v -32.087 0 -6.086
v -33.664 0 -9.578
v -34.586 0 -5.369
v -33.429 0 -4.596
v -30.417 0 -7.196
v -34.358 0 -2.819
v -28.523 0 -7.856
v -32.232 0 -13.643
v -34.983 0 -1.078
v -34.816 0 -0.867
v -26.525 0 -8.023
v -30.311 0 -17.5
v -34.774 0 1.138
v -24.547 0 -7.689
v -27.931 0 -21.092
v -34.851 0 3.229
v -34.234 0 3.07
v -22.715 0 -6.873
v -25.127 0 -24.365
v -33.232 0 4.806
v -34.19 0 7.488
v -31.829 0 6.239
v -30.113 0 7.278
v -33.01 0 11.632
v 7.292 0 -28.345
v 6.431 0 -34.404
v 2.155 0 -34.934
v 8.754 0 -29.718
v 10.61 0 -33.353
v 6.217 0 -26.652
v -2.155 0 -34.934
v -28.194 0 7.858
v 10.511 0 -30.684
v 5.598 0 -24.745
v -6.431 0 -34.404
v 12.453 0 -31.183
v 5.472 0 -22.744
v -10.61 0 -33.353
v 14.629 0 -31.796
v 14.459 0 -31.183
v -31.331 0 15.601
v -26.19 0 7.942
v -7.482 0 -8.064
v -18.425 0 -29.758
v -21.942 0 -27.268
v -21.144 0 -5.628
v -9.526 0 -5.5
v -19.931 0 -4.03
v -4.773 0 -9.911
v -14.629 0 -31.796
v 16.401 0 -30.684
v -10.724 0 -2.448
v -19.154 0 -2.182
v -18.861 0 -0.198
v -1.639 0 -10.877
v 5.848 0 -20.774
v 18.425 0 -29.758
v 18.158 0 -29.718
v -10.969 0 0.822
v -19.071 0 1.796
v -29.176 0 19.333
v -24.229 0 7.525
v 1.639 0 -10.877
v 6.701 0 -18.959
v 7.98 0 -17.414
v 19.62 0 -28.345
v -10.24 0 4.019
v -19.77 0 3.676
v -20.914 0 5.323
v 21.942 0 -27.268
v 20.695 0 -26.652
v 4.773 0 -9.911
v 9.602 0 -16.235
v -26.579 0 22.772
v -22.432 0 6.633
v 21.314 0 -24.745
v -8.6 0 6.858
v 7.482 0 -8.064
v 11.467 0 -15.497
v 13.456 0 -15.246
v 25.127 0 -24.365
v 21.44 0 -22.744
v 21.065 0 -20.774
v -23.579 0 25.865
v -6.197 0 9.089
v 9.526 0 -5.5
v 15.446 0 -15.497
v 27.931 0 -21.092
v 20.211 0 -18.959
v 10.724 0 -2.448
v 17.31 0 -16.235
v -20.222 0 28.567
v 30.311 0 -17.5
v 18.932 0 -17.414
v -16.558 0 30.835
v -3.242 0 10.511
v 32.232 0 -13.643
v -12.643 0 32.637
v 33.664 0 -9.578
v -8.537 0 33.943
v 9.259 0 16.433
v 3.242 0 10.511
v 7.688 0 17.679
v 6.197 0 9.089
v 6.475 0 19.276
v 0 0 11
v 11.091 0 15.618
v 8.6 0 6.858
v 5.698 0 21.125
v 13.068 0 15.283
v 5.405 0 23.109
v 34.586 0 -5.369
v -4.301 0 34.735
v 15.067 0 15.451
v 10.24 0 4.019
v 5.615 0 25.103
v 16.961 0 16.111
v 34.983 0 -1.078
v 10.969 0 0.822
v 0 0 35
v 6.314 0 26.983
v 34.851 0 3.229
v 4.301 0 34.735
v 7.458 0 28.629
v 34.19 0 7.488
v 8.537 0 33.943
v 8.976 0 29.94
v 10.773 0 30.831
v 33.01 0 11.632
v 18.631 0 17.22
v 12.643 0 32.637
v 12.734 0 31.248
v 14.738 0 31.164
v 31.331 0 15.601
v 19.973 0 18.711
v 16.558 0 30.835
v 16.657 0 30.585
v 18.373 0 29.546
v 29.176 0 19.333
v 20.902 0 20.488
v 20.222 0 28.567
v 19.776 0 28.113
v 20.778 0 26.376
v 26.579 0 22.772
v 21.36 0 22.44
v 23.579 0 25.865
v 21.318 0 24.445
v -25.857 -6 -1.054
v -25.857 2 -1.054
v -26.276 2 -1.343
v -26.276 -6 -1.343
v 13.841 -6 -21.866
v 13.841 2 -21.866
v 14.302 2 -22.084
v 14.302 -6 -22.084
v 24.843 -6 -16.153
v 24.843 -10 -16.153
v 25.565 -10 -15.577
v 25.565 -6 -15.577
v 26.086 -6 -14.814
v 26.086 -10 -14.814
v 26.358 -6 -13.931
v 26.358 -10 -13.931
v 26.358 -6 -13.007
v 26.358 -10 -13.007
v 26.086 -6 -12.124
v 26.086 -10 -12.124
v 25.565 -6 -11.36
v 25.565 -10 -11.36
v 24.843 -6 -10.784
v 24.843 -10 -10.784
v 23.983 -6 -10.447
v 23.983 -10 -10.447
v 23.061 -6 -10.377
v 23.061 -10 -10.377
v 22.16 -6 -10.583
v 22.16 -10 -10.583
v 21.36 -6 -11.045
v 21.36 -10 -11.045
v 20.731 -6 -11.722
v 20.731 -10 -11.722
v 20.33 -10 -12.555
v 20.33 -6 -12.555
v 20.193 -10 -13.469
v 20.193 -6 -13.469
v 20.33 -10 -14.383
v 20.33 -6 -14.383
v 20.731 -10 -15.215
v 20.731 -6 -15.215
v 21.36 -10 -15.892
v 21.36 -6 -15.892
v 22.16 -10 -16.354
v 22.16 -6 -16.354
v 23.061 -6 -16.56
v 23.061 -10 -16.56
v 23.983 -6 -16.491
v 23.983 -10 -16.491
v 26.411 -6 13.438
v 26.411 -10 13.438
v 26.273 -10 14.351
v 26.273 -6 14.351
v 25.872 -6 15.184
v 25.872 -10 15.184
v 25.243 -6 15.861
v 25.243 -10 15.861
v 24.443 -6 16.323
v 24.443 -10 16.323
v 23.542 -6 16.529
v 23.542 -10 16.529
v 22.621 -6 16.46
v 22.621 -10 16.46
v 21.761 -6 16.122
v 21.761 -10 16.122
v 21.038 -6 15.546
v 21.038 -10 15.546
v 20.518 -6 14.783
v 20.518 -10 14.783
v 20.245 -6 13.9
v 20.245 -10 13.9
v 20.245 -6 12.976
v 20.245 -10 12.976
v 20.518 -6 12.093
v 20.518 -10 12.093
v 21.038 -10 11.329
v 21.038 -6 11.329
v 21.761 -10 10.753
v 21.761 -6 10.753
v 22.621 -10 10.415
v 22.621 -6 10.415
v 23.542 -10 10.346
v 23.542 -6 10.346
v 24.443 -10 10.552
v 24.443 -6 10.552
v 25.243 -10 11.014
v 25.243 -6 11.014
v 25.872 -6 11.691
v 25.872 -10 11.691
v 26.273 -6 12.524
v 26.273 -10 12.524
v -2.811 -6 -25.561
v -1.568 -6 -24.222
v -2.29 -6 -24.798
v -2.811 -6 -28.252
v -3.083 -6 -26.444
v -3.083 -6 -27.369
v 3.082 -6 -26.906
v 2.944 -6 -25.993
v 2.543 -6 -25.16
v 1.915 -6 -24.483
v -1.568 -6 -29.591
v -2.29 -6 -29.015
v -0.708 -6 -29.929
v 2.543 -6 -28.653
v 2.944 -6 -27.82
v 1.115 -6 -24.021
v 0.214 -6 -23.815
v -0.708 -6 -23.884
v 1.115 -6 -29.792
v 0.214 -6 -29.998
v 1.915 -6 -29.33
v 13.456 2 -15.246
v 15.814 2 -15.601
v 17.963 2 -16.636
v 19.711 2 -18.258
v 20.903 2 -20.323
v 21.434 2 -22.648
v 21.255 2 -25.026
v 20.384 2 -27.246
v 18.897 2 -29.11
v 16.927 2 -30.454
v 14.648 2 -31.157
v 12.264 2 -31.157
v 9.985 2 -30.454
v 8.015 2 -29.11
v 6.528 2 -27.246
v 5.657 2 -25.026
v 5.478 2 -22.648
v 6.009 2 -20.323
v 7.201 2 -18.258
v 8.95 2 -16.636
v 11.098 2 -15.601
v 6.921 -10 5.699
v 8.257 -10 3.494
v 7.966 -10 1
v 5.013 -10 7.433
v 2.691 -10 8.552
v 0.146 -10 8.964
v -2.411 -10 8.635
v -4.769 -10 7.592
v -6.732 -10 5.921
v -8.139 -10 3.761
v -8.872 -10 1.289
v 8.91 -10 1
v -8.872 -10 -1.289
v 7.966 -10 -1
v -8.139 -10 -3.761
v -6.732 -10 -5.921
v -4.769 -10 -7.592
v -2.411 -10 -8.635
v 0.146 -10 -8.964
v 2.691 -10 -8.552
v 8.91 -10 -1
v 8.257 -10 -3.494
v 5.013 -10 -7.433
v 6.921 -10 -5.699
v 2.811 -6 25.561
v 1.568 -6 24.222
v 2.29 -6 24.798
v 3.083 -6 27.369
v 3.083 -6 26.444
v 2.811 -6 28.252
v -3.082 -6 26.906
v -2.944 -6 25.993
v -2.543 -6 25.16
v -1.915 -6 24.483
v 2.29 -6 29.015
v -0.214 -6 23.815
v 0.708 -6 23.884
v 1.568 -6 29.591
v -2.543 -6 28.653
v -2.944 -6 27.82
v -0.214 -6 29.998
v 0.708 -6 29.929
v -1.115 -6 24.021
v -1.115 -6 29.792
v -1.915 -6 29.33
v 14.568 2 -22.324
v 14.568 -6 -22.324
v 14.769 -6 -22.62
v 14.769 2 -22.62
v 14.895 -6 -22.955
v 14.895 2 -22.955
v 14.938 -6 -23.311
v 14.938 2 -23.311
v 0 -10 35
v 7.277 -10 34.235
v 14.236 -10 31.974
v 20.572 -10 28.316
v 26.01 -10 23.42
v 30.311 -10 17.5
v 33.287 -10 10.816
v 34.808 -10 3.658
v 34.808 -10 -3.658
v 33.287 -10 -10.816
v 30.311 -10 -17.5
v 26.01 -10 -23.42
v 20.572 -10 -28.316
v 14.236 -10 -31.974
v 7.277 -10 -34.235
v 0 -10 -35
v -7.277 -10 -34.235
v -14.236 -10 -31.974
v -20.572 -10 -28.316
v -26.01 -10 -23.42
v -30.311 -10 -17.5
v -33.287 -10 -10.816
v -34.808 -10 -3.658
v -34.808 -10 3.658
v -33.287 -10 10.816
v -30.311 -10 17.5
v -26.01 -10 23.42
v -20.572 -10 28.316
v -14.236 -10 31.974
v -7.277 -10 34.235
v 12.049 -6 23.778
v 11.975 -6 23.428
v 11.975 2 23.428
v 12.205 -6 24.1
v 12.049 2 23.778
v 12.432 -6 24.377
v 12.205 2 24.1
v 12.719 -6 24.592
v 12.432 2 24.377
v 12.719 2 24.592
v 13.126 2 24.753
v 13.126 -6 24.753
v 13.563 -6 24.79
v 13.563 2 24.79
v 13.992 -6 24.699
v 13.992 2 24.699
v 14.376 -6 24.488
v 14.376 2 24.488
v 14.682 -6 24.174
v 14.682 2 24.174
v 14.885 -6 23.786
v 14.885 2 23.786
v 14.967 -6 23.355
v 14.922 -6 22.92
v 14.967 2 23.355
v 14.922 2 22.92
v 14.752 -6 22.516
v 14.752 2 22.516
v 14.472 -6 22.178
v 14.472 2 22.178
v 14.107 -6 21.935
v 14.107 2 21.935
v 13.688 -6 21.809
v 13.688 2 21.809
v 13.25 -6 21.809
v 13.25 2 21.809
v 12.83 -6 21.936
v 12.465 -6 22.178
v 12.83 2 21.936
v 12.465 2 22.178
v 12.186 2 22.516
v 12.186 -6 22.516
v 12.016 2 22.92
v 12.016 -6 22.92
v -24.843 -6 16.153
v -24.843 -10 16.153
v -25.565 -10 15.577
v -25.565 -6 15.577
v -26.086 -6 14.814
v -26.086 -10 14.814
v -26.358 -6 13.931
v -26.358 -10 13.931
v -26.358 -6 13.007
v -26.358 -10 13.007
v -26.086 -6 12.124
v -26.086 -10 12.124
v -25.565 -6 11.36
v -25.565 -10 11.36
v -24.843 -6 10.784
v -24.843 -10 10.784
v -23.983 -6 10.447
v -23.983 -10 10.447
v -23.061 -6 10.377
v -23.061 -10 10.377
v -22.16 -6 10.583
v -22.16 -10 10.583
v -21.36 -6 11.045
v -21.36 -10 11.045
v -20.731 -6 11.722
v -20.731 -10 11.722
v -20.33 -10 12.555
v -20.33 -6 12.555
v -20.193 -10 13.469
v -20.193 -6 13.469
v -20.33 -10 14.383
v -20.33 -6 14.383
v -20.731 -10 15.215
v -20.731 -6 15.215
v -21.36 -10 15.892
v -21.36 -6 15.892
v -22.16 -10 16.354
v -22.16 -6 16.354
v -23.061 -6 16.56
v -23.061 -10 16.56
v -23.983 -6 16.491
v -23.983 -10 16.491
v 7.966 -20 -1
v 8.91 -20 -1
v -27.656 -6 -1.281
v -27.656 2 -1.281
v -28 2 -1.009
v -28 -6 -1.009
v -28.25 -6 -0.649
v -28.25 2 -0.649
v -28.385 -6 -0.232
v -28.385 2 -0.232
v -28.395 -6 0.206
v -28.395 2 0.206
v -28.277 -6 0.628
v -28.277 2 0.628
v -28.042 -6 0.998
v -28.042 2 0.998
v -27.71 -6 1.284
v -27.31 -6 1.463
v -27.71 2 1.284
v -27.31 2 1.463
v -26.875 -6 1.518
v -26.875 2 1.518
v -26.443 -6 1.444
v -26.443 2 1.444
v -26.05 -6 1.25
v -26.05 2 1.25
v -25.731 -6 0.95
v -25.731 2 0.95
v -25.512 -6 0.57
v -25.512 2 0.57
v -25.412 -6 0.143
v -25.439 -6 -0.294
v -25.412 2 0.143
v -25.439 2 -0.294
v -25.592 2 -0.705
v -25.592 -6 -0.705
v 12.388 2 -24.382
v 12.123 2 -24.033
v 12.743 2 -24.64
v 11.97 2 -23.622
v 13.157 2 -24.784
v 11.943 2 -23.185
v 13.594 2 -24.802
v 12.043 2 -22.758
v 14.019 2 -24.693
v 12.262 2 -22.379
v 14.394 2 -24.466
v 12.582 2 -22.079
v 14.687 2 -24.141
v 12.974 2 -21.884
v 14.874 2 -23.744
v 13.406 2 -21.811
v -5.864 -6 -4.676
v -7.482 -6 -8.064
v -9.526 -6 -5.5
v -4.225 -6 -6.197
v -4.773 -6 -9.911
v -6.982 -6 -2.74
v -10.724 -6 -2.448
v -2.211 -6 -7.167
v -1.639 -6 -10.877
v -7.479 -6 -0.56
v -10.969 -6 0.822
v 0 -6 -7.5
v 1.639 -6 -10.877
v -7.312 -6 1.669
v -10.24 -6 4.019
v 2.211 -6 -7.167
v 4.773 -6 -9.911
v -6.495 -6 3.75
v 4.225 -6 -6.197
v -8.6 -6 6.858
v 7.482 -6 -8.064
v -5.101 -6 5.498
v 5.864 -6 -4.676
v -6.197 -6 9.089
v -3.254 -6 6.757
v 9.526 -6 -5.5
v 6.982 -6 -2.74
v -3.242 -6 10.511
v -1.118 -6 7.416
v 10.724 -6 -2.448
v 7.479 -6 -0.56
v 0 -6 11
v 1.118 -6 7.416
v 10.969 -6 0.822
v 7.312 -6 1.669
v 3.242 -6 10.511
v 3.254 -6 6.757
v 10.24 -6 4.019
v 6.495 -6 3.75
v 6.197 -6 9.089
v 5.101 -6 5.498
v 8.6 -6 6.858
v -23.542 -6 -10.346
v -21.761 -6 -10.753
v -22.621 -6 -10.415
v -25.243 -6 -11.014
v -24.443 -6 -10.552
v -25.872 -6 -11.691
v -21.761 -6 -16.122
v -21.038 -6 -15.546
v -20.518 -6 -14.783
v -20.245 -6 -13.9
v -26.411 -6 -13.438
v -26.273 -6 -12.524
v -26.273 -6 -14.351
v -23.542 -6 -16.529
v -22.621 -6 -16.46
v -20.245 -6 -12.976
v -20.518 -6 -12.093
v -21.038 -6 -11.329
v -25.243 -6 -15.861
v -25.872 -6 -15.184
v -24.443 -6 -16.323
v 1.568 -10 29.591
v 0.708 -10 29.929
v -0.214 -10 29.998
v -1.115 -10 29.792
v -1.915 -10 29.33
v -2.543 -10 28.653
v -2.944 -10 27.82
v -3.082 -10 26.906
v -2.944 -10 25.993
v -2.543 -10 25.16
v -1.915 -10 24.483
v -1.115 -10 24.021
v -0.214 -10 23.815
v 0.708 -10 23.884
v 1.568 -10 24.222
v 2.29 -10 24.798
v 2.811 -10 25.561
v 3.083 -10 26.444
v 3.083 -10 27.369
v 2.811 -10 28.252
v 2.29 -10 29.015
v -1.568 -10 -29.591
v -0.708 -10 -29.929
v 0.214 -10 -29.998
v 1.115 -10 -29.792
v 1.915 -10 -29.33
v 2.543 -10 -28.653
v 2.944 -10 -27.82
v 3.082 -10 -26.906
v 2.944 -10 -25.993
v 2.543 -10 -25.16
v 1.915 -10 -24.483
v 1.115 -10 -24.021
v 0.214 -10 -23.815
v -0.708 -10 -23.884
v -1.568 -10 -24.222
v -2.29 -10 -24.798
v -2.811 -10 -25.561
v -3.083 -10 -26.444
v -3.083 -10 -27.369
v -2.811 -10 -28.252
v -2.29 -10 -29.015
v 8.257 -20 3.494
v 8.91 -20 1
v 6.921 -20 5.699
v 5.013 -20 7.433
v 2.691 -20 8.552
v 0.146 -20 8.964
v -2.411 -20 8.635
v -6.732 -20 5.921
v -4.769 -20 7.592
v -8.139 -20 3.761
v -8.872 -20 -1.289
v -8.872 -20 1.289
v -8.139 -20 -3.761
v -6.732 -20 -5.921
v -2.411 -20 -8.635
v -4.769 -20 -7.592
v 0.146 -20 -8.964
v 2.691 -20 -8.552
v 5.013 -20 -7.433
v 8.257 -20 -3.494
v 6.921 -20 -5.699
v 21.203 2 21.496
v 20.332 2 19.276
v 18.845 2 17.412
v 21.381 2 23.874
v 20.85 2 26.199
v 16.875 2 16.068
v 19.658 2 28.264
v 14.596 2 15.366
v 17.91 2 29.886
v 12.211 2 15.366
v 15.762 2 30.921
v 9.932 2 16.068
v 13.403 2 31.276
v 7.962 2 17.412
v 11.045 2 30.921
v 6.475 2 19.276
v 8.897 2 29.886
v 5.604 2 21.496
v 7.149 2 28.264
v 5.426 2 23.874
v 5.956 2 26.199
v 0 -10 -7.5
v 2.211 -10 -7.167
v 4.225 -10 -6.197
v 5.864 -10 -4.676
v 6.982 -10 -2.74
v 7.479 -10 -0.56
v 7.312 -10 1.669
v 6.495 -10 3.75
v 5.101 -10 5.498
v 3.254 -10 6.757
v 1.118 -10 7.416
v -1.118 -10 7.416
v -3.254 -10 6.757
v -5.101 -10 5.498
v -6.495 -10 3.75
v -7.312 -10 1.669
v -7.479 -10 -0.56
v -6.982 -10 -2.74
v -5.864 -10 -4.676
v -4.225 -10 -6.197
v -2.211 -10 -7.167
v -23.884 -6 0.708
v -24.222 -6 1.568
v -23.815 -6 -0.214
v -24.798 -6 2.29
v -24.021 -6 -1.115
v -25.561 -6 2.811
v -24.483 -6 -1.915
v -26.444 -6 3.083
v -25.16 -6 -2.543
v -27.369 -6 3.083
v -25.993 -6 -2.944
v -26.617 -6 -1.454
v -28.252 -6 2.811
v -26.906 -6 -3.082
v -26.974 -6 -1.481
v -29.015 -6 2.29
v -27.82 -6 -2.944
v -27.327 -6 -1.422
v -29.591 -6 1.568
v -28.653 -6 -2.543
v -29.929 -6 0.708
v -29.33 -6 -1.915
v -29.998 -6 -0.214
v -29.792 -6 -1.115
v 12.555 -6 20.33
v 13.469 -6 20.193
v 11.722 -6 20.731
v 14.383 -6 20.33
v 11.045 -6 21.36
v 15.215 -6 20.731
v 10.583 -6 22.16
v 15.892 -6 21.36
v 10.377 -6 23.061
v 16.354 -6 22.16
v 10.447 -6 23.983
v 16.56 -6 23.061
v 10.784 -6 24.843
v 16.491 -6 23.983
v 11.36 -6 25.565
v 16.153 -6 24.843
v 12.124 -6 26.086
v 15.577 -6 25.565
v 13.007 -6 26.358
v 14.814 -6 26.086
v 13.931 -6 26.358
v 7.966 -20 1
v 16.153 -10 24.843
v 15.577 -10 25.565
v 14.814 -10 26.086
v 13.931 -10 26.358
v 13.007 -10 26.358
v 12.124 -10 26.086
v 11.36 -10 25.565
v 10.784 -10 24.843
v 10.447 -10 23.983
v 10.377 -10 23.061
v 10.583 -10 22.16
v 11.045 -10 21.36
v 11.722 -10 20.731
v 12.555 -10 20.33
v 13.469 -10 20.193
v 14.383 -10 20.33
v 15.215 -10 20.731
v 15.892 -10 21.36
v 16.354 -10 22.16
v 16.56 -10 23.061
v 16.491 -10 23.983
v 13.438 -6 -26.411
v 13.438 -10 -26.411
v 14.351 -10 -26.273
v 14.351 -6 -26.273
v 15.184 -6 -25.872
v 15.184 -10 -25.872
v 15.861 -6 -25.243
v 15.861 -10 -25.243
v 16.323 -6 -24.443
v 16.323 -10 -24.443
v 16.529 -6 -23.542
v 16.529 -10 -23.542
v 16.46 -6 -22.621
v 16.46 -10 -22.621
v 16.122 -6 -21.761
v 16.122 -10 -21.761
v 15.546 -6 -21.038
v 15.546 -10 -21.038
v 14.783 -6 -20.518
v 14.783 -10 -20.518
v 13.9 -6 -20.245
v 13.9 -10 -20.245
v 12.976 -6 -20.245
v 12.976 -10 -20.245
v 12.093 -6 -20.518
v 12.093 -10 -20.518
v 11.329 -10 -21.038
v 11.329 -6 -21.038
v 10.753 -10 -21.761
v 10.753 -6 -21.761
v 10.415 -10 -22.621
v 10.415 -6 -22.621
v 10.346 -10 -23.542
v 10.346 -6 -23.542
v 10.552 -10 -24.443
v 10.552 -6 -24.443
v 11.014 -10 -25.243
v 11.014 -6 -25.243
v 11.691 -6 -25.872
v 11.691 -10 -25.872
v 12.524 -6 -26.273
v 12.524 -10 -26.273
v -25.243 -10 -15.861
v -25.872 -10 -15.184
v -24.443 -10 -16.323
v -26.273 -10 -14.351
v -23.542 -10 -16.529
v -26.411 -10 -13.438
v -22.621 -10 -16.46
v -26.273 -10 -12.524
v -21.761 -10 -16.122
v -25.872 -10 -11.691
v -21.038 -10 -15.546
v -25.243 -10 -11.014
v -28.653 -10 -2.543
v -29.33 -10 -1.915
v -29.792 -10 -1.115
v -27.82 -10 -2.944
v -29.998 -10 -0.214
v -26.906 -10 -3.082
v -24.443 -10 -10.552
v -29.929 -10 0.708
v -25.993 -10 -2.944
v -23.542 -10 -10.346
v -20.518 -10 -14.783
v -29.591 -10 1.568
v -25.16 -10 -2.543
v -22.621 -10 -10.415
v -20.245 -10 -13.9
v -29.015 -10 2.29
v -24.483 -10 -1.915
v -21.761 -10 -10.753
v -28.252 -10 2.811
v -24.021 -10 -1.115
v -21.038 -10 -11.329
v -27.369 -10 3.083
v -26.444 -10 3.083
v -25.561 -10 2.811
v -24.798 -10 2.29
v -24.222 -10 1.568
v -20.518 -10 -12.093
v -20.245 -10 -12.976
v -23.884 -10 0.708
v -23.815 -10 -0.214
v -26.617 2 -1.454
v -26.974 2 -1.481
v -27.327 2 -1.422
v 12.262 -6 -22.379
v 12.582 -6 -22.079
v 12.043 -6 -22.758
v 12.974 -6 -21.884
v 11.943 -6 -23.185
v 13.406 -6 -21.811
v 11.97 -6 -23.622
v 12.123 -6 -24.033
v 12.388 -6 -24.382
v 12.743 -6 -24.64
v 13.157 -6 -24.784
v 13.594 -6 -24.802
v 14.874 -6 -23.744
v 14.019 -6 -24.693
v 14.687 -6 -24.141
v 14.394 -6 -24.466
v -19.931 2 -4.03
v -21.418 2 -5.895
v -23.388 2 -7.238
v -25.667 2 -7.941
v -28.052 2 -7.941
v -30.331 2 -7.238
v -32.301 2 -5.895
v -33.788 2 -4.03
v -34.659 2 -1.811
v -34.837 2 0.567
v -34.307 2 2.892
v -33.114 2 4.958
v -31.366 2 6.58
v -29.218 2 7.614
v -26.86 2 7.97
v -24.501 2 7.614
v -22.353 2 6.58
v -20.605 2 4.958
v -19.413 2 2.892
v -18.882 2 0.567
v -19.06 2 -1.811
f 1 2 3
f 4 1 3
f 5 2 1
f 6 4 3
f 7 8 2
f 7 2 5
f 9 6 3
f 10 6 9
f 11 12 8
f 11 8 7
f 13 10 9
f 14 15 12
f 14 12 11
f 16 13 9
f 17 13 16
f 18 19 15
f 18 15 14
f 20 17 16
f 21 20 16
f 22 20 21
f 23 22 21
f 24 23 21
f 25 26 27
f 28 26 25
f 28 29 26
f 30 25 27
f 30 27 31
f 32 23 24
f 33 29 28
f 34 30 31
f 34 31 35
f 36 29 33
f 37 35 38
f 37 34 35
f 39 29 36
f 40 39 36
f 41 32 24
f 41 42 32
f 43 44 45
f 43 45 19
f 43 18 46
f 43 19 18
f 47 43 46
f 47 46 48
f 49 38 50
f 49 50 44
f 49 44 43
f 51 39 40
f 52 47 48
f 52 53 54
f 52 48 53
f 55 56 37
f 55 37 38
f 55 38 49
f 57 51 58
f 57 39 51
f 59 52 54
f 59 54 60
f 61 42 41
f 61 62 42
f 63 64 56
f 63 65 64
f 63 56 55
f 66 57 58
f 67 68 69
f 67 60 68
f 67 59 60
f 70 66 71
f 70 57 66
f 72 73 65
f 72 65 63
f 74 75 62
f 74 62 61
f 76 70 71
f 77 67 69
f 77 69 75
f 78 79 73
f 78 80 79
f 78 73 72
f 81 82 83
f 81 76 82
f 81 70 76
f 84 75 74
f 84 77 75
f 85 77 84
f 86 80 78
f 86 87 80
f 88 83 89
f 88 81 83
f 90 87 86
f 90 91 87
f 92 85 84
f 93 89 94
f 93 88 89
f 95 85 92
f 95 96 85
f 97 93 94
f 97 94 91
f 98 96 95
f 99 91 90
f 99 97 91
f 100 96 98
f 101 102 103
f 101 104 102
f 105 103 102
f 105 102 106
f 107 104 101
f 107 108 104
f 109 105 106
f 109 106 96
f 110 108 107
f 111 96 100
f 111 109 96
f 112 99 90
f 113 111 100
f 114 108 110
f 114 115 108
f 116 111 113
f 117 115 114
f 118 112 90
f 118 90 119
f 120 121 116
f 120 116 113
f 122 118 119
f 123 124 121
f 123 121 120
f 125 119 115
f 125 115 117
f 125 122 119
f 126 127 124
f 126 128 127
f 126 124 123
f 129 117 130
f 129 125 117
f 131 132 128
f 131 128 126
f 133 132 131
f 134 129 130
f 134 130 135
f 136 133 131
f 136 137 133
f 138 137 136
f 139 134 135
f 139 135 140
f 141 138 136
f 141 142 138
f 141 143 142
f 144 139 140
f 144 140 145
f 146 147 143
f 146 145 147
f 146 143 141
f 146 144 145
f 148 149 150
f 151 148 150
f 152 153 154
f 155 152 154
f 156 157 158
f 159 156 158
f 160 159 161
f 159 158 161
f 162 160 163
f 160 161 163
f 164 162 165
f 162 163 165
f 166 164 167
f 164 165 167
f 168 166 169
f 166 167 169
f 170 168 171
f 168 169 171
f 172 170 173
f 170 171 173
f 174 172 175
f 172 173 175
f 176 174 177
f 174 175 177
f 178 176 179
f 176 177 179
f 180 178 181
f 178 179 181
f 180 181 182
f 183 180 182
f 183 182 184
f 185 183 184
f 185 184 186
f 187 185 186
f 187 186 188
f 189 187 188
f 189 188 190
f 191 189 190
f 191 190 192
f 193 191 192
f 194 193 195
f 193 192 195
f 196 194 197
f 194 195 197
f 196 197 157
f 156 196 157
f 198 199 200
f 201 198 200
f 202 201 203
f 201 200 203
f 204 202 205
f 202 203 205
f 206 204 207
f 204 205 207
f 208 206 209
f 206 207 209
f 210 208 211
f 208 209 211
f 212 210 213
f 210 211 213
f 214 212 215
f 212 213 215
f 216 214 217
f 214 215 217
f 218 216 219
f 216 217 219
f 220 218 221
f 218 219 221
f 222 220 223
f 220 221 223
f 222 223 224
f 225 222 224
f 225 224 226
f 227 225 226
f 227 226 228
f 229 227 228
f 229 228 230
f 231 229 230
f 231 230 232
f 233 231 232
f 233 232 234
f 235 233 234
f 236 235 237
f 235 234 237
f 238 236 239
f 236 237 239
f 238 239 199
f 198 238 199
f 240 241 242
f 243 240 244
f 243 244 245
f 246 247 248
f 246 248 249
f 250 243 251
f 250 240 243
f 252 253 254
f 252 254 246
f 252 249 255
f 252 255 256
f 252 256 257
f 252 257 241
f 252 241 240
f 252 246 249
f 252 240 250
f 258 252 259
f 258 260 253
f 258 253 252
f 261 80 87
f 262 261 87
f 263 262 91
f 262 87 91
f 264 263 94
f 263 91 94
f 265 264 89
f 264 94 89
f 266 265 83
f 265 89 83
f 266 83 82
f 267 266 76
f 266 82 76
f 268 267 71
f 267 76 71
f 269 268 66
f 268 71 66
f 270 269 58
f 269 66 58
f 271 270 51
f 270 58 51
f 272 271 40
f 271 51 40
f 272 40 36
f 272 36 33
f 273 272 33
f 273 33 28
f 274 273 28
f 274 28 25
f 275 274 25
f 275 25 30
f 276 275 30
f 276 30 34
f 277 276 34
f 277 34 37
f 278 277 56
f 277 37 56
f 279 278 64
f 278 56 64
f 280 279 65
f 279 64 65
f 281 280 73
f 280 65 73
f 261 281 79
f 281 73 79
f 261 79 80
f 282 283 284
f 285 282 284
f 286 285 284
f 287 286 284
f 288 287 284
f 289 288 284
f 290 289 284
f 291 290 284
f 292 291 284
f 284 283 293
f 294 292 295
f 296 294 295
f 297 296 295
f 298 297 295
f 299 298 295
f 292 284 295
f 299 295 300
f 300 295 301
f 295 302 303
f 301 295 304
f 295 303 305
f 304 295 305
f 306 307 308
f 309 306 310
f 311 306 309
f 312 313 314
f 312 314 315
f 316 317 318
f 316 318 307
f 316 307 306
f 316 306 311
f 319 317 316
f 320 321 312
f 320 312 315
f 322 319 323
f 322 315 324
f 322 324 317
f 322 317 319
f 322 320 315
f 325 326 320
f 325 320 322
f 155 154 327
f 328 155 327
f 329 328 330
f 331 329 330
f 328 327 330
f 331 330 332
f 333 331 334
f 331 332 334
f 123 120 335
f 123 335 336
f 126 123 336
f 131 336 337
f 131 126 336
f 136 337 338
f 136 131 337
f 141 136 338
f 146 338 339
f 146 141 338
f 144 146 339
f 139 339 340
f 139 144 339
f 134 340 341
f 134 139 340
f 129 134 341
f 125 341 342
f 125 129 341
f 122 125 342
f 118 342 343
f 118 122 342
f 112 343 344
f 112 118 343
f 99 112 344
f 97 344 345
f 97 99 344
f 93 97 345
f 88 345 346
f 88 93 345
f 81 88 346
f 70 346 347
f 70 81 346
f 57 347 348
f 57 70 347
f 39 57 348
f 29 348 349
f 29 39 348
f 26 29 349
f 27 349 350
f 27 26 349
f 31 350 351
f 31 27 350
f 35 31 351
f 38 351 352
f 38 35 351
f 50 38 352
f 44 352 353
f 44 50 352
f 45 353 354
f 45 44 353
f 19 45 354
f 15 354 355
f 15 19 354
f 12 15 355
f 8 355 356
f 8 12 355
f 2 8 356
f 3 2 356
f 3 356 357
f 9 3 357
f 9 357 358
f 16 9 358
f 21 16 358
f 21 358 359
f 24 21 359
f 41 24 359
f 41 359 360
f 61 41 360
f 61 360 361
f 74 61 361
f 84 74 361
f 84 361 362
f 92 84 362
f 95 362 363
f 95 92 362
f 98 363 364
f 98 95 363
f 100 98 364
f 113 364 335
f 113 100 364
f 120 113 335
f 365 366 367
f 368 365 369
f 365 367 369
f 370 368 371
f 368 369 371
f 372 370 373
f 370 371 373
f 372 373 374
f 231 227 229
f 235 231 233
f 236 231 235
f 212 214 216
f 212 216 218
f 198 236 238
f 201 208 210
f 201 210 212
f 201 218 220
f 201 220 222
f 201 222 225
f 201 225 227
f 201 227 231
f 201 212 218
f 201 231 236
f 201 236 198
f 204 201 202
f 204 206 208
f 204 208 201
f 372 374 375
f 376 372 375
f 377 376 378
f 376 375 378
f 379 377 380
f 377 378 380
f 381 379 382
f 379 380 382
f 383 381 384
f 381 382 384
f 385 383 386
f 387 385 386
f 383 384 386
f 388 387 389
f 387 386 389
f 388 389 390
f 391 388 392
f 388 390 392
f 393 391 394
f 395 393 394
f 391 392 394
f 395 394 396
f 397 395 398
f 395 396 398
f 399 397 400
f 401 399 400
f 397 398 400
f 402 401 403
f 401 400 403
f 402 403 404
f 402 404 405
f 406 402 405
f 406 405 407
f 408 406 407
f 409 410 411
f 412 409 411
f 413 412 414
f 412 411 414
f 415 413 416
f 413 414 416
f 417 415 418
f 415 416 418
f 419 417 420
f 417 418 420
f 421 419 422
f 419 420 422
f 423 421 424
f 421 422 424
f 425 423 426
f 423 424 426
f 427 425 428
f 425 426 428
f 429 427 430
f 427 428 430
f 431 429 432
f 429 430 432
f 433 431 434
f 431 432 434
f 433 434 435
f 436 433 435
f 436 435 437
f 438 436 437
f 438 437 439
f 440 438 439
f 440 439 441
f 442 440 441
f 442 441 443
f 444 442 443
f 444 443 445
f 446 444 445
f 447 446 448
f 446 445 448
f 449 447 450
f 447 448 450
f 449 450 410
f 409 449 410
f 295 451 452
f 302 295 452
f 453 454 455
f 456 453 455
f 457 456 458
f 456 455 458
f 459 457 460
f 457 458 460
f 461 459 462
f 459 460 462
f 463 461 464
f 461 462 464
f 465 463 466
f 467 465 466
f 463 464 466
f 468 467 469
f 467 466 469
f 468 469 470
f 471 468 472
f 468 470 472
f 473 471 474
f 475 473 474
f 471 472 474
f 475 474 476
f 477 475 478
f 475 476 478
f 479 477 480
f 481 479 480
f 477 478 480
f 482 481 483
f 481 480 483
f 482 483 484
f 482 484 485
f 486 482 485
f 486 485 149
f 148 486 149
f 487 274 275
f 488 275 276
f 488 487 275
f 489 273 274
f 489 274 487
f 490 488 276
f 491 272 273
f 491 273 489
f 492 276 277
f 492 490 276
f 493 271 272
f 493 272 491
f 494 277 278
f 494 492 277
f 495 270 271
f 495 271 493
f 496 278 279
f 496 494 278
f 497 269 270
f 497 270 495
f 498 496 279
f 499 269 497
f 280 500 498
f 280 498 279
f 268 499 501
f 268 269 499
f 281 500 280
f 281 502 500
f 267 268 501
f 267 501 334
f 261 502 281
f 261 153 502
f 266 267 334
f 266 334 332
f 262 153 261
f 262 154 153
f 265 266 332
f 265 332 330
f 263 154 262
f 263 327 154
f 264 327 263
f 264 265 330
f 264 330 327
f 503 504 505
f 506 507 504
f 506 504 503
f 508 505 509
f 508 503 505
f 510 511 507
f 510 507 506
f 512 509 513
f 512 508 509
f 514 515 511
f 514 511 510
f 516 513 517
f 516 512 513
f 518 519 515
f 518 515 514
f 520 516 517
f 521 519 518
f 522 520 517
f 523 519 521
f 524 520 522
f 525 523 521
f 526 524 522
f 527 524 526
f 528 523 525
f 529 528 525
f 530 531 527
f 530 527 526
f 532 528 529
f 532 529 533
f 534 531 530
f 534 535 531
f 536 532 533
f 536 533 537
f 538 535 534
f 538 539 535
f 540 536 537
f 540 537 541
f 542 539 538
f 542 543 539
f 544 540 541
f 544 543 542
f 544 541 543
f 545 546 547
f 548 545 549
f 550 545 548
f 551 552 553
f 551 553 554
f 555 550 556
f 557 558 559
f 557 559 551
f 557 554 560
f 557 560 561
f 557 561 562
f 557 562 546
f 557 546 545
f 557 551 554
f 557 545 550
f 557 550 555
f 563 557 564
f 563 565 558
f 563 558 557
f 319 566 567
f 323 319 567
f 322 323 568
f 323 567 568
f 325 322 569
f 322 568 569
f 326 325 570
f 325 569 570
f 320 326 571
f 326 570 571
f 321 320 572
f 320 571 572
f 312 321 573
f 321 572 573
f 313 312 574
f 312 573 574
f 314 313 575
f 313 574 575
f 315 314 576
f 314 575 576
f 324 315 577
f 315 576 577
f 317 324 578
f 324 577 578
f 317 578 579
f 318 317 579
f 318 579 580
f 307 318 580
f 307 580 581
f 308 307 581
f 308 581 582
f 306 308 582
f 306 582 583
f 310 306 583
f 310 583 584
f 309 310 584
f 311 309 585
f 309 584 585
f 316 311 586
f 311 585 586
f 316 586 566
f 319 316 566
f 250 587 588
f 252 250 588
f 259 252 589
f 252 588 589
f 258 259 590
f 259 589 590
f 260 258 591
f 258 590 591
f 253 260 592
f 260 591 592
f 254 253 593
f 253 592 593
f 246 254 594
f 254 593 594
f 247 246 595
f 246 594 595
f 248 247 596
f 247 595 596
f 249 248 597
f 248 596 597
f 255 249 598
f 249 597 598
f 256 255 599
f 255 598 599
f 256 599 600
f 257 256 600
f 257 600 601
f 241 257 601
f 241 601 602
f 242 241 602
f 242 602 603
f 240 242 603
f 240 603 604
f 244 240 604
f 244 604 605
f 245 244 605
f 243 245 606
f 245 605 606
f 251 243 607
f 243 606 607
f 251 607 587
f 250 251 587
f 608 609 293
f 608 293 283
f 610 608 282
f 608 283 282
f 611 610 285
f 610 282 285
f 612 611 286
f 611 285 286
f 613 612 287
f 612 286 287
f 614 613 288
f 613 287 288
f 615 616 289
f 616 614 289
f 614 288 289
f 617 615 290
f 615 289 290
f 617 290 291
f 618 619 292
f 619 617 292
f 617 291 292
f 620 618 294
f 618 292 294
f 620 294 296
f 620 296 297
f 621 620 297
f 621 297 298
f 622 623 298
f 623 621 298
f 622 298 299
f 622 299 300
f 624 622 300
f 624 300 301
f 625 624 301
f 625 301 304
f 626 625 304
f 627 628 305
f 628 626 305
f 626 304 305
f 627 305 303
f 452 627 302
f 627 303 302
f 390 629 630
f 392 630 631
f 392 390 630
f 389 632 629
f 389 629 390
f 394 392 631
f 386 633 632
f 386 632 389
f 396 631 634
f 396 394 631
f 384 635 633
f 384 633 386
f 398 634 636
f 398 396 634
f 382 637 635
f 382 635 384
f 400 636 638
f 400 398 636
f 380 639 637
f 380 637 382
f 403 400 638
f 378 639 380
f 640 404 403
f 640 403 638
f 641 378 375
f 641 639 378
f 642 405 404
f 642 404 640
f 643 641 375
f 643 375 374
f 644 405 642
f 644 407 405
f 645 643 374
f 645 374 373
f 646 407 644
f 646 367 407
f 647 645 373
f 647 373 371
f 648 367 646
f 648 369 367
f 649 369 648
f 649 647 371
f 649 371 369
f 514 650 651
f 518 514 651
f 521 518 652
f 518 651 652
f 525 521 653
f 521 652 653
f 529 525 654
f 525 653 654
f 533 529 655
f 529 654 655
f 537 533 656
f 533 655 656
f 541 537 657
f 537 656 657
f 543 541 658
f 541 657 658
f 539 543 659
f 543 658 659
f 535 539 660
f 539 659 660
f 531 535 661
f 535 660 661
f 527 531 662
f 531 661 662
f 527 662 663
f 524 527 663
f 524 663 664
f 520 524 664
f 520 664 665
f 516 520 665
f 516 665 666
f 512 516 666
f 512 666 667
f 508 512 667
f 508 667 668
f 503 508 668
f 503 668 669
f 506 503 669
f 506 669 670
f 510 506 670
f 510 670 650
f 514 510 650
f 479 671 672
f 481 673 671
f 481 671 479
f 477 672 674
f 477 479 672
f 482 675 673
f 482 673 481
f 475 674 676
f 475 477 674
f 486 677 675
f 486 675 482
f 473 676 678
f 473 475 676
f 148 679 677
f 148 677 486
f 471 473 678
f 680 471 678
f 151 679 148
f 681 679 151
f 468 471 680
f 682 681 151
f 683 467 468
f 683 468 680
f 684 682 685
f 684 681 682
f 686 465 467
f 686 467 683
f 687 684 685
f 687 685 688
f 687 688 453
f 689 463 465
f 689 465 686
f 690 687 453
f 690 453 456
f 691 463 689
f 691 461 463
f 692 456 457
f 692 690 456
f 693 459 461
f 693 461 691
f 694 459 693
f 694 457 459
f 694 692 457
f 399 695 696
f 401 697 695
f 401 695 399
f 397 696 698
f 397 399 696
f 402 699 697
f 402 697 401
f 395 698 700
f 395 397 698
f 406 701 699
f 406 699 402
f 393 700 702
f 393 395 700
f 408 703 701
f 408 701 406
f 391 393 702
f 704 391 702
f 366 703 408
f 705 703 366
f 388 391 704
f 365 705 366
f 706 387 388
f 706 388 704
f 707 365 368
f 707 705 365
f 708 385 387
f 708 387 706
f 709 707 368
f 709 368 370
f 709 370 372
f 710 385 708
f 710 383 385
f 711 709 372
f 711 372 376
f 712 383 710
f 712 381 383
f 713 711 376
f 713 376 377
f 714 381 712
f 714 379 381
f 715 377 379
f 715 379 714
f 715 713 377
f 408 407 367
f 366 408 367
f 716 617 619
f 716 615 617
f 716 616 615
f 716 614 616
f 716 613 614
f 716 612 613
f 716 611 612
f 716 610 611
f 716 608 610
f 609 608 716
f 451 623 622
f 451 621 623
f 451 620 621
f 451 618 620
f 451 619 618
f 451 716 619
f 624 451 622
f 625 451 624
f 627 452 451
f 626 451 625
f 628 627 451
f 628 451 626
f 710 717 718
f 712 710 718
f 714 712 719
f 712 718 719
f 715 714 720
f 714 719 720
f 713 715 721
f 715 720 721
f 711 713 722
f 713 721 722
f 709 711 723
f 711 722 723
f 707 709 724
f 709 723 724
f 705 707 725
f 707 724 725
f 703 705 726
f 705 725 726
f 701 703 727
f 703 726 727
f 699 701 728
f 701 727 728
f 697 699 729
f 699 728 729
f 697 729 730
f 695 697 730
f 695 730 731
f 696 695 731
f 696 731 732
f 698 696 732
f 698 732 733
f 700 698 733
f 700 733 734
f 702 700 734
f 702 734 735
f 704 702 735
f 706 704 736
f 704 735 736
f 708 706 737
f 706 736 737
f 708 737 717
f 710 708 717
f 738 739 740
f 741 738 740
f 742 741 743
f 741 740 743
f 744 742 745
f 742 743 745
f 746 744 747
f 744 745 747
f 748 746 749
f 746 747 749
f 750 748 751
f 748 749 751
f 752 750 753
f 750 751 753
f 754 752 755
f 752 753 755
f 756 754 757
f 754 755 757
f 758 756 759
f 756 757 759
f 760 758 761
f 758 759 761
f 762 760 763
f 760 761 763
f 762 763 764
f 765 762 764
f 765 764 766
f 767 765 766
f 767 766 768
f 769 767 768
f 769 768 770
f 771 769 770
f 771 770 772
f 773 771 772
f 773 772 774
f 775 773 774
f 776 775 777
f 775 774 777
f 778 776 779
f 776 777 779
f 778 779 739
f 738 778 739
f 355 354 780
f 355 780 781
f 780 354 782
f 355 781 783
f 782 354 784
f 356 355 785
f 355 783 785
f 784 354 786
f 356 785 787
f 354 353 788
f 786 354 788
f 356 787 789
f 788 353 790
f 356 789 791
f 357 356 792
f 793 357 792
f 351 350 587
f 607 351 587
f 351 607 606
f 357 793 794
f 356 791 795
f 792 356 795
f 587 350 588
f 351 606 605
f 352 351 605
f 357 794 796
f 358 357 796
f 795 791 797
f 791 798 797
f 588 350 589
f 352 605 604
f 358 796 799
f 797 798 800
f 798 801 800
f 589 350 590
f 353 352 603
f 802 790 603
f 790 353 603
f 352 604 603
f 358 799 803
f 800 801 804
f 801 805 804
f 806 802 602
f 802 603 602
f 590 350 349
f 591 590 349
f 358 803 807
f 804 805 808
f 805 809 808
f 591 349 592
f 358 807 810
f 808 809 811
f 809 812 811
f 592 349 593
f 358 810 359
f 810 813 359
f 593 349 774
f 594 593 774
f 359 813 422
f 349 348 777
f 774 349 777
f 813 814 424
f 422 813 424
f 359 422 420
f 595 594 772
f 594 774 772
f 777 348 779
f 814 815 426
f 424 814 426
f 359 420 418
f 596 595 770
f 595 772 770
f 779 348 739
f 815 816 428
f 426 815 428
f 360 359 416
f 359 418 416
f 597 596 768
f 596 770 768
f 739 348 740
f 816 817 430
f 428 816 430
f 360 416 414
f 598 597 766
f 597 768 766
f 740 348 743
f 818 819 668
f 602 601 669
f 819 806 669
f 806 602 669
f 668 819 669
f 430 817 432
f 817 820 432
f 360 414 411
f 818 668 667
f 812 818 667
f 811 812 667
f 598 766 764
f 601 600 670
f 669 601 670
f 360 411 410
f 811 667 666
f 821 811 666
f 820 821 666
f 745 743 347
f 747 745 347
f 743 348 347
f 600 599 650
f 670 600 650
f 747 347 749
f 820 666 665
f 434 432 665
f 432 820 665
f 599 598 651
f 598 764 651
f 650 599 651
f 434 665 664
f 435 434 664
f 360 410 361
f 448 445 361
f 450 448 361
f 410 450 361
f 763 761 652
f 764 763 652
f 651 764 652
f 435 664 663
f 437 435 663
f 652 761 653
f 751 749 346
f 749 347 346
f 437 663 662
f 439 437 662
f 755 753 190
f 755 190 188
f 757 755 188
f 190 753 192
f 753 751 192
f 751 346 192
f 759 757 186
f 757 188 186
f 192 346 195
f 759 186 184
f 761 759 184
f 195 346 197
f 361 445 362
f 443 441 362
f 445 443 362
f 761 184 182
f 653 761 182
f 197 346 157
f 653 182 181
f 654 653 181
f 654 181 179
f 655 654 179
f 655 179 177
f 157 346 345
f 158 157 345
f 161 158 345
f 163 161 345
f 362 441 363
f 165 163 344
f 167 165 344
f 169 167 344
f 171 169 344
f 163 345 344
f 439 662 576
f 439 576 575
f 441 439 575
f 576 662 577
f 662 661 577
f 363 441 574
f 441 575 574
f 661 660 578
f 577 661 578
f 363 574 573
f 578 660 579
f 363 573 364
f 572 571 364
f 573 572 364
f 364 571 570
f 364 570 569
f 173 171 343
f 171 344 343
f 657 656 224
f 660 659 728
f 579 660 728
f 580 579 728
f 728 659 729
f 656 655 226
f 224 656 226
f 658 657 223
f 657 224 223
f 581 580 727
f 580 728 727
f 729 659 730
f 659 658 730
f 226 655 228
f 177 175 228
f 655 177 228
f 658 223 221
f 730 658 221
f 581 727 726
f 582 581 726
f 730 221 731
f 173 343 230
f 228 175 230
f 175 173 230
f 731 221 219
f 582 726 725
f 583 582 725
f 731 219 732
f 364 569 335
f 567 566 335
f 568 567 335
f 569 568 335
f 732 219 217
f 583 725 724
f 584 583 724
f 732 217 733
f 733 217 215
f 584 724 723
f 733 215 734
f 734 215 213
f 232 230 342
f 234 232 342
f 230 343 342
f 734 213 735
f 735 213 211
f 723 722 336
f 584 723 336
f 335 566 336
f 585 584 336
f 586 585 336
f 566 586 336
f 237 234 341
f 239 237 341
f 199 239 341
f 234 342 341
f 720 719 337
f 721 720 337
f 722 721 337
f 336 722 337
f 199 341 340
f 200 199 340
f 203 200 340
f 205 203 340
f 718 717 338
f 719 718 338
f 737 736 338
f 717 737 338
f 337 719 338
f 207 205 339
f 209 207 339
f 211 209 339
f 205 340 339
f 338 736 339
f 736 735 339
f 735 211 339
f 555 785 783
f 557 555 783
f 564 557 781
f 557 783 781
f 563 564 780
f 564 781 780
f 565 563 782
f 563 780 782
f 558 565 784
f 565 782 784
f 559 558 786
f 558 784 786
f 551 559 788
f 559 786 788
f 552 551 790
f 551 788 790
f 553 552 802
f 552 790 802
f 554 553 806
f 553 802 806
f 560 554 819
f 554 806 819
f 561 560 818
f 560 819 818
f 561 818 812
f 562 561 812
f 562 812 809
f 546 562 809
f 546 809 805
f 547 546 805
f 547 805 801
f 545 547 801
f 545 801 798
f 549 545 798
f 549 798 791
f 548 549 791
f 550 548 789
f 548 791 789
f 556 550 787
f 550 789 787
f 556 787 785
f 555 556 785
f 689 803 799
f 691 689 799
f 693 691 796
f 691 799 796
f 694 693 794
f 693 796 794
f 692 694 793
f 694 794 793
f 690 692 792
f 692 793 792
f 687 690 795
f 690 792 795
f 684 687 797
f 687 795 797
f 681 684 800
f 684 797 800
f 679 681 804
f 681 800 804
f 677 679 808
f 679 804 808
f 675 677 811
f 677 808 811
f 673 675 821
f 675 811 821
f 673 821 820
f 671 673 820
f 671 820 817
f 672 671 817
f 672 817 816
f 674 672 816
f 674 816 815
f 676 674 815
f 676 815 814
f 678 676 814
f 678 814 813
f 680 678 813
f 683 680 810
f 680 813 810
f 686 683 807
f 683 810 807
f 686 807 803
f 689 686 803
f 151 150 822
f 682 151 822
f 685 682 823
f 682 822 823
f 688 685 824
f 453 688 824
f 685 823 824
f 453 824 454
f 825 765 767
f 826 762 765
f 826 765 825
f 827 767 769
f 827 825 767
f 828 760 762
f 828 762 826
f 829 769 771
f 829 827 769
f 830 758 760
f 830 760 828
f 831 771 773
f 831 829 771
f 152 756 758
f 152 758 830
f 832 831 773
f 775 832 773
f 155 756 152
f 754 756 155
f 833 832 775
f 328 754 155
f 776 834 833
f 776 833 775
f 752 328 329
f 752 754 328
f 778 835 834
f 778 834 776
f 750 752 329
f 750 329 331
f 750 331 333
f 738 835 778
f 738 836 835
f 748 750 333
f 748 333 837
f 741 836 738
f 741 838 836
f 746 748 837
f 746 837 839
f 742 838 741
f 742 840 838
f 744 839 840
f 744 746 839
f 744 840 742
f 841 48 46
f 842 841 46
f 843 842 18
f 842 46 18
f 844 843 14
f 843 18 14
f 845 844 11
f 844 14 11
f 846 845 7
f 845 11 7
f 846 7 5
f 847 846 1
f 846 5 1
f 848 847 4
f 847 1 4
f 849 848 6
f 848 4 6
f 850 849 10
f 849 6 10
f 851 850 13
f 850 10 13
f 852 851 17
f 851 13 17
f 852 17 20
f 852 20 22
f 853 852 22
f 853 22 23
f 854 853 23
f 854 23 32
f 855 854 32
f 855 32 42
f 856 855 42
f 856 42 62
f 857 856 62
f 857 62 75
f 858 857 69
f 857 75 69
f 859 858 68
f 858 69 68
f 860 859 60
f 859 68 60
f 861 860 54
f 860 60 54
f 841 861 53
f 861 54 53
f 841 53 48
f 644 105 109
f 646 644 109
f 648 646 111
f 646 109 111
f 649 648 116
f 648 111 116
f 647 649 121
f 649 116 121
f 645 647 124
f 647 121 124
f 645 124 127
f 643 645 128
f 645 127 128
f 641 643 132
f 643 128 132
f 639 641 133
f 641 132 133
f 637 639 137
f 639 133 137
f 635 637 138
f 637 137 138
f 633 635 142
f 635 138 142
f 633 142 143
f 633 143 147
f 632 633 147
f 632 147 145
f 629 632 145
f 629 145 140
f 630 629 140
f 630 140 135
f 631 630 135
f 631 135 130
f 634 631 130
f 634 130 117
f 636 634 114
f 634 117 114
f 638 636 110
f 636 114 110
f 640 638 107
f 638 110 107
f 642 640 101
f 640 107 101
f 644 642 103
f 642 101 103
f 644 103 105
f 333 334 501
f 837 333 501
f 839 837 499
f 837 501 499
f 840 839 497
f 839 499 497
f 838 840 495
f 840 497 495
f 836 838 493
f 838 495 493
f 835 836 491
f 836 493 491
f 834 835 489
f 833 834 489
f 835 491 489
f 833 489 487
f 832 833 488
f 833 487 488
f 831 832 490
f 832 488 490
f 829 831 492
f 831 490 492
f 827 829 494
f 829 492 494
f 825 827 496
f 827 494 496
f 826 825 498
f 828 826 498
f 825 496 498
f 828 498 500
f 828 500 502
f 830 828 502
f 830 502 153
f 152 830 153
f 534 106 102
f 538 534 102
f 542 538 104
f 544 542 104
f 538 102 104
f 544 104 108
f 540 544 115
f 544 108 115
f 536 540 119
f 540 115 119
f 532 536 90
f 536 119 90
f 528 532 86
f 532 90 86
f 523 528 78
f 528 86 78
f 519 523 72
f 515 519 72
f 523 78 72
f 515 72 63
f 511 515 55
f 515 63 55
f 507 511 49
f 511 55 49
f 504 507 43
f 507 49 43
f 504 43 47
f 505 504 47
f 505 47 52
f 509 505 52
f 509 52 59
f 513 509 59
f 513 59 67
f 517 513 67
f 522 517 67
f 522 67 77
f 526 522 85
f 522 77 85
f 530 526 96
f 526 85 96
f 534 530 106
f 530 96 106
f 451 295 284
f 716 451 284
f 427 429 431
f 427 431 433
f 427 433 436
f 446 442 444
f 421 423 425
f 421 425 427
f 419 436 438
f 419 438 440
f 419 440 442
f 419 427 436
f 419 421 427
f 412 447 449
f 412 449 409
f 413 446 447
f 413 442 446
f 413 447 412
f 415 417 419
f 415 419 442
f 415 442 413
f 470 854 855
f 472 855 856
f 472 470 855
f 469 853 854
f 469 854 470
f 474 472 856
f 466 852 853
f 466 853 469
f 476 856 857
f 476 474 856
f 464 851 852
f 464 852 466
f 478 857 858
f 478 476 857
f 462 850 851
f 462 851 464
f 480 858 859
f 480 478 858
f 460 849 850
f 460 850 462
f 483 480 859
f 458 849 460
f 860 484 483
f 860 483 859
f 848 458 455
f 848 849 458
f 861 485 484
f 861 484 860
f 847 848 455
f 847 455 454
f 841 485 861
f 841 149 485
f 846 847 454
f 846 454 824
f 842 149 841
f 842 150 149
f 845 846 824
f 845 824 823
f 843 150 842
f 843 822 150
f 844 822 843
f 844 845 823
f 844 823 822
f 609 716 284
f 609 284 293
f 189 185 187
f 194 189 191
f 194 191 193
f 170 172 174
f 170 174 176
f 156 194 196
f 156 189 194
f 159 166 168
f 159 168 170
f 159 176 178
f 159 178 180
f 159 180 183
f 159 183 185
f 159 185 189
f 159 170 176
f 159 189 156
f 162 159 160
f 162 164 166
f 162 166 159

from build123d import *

# Parameters (mm, degrees)
SKETCH1_R                   = 35
BOSS_EXTRUDE1_DEPTH         = 10
SKETCH2_R                   = 11
CUT_EXTRUDE1_DEPTH          = 6
SKETCH3_R                   = 7.5
CUT_EXTRUDE2_DEPTH          = 6
SKETCH4_R                   = 8
BOSS_EXTRUDE2_DEPTH         = 2
CUT_EXTRUDE3_DEPTH          = 21
SKETCH6_R                   = 3.1
CUT_EXTRUDE4_DEPTH          = 4
CIRPATTERN1_COUNT           = 3
CIRPATTERN2_COUNT           = 3
CIRPATTERN3_COUNT           = 2
CIRPATTERN3_ANGLE           = 30
CIRPATTERN4_COUNT           = 2
CIRPATTERN4_ANGLE           = 30
CIRPATTERN5_COUNT           = 3
CIRPATTERN5_COPY_1_SKETCH_R = 3.1
CIRPATTERN5_COPY_1_DEPTH    = 4
CIRPATTERN5_COPY_2_SKETCH_R = 3.1
CIRPATTERN5_COPY_2_DEPTH    = 4
CIRPATTERN5_COPY_3_SKETCH_R = 3.1
CIRPATTERN5_COPY_3_DEPTH    = 4
CIRPATTERN5_COPY_4_SKETCH_R = 3.1
CIRPATTERN5_COPY_4_DEPTH    = 4
SKETCH7_R                   = 8.965645278
BOSS_EXTRUDE3_DEPTH         = 10
SKETCH8_W                   = 2
SKETCH8_H                   = 2
CUT_EXTRUDE5_DEPTH          = 10


with BuildPart() as part:
    # Sketch1 → Boss-Extrude1 (new body)
    with BuildSketch(Plane(origin=(0, 0, 0), x_dir=(1, 0, 0), z_dir=(0, 1, 0))):
        with Locations(Location((0, 0, 0), (0, 0, 270))):
            Circle(SKETCH1_R)
    extrude(amount=-BOSS_EXTRUDE1_DEPTH)

    # Sketch2 → Cut-Extrude1 (cut)
    with BuildSketch(Plane(origin=(0, 0, 0), x_dir=(1, 0, 0), z_dir=(0, 1, 0))):
        with Locations(Location((0, 0, 0), (0, 0, 270))):
            Circle(SKETCH2_R)
    extrude(amount=-CUT_EXTRUDE1_DEPTH, mode=Mode.SUBTRACT)

    # Sketch3 → Cut-Extrude2 (cut)
    with BuildSketch(Plane.XZ.offset(10)):
        with Locations(Location((0, 0, 0), (0, 0, 270))):
            Circle(SKETCH3_R)
    extrude(amount=-CUT_EXTRUDE2_DEPTH, mode=Mode.SUBTRACT)

    # Sketch4 → Boss-Extrude2 (add)
    with BuildSketch(Plane(origin=(0, 0, 0), x_dir=(1, 0, 0), z_dir=(0, 1, 0))):
        with Locations(Location((13.45606226, 23.245861182, 0), (0, 0, 270))):
            Circle(SKETCH4_R)
    boss_extrude2 = extrude(amount=BOSS_EXTRUDE2_DEPTH)

    # Sketch5 → Cut-Extrude3 (cut)
    with BuildSketch(Plane(origin=(0, 2, 0), x_dir=(1, 0, 0), z_dir=(0, 1, 0))):
        with BuildLine():
            Line((13.841241823, 21.865976381), (14.30157773, 22.084407474))
            ThreePointArc((14.30157773, 22.084407474), (14.769217525, 22.619952494), (14.937716007, 23.310679436))
            ThreePointArc((14.937716007, 23.310679436), (12.242875281, 24.2175177), (13.841241823, 21.865976381))
        make_face()
    cut_extrude3 = extrude(amount=-CUT_EXTRUDE3_DEPTH, mode=Mode.SUBTRACT)

    # Sketch6 → Cut-Extrude4 (cut)
    with BuildSketch(Plane.XZ.offset(10)):
        with Locations(Location((13.437716007, -23.310679436, 0), (0, 0, 270))):
            Circle(SKETCH6_R)
    cut_extrude4 = extrude(amount=-CUT_EXTRUDE4_DEPTH, mode=Mode.SUBTRACT)

    # CirPattern1: Boss-Extrude2 ×3 about axis
    cirpattern1_axis = Axis((0, 0, 0), (0, 1, 0))
    for i in range(1, CIRPATTERN1_COUNT):
        add(boss_extrude2.rotate(cirpattern1_axis, i * 360 / CIRPATTERN1_COUNT))

    # CirPattern2: Cut-Extrude3 ×3 about axis
    cirpattern2_axis = Axis((0, 0, 0), (0, 1, 0))
    for i in range(1, CIRPATTERN2_COUNT):
        add(cut_extrude3.rotate(cirpattern2_axis, i * 360 / CIRPATTERN2_COUNT), mode=Mode.SUBTRACT)

    # CirPattern3: Cut-Extrude4 ×2 about axis
    cirpattern3_axis = Axis((0, -4, 0), (0, 1, 0))
    for i in range(1, CIRPATTERN3_COUNT):
        add(cut_extrude4.rotate(cirpattern3_axis, i * CIRPATTERN3_ANGLE / (CIRPATTERN3_COUNT - 1)), mode=Mode.SUBTRACT)

    # CirPattern4: Cut-Extrude4 ×2 about axis
    cirpattern4_axis = Axis((0, -10, 0), (0, -1, 0))
    for i in range(1, CIRPATTERN4_COUNT):
        add(cut_extrude4.rotate(cirpattern4_axis, i * CIRPATTERN4_ANGLE / (CIRPATTERN4_COUNT - 1)), mode=Mode.SUBTRACT)

    # CirPattern5: Cut-Extrude4 ×3 about axis
    cirpattern5_axis = Axis((0, 0, 0), (0, 1, 0))
    for i in range(1, CIRPATTERN5_COUNT):
        add(cut_extrude4.rotate(cirpattern5_axis, i * 360 / CIRPATTERN5_COUNT), mode=Mode.SUBTRACT)

    # CirPattern5 copy 1 sketch → CirPattern5 copy 1 (cut)
    with BuildSketch(Plane(origin=(0, -10, 0), x_dir=(-0.8660254037844389, 0, -0.4999999999999994), z_dir=(0, -1, 0))):
        with Locations(Location((13.437716007, -23.310679436, 0), (0, 0, 270))):
            Circle(CIRPATTERN5_COPY_1_SKETCH_R)
    extrude(amount=-CIRPATTERN5_COPY_1_DEPTH, mode=Mode.SUBTRACT)

    # CirPattern5 copy 2 sketch → CirPattern5 copy 2 (cut)
    with BuildSketch(Plane(origin=(0, -10, 0), x_dir=(0, 0, 1), z_dir=(0, -1, 0))):
        with Locations(Location((13.437716007, -23.310679436, 0), (0, 0, 270))):
            Circle(CIRPATTERN5_COPY_2_SKETCH_R)
    extrude(amount=-CIRPATTERN5_COPY_2_DEPTH, mode=Mode.SUBTRACT)

    # CirPattern5 copy 3 sketch → CirPattern5 copy 3 (cut)
    with BuildSketch(Plane(origin=(0, -10, 0), x_dir=(0, 0, -1), z_dir=(0, -1, 0))):
        with Locations(Location((13.437716007, -23.310679436, 0), (0, 0, 270))):
            Circle(CIRPATTERN5_COPY_3_SKETCH_R)
    extrude(amount=-CIRPATTERN5_COPY_3_DEPTH, mode=Mode.SUBTRACT)

    # CirPattern5 copy 4 sketch → CirPattern5 copy 4 (cut)
    with BuildSketch(Plane(origin=(0, -10, 0), x_dir=(-0.8660254037844393, 0, 0.4999999999999987), z_dir=(0, -1, 0))):
        with Locations(Location((13.437716007, -23.310679436, 0), (0, 0, 270))):
            Circle(CIRPATTERN5_COPY_4_SKETCH_R)
    extrude(amount=-CIRPATTERN5_COPY_4_DEPTH, mode=Mode.SUBTRACT)


with BuildPart() as body_2:
    # Sketch7 → Boss-Extrude3 (new body)
    with BuildSketch(Plane.XZ.offset(10)):
        with Locations(Location((0, 0, 0), (0, 0, 270))):
            Circle(SKETCH7_R)
    extrude(amount=BOSS_EXTRUDE3_DEPTH)

    # Sketch8 → Cut-Extrude5 (cut)
    with BuildSketch(Plane.XZ.offset(20)):
        with Locations((8.965645278, 0)):
            Rectangle(SKETCH8_W, SKETCH8_H)
    extrude(amount=-CUT_EXTRUDE5_DEPTH, mode=Mode.SUBTRACT)


solid = Compound([part.part, body_2.part])
